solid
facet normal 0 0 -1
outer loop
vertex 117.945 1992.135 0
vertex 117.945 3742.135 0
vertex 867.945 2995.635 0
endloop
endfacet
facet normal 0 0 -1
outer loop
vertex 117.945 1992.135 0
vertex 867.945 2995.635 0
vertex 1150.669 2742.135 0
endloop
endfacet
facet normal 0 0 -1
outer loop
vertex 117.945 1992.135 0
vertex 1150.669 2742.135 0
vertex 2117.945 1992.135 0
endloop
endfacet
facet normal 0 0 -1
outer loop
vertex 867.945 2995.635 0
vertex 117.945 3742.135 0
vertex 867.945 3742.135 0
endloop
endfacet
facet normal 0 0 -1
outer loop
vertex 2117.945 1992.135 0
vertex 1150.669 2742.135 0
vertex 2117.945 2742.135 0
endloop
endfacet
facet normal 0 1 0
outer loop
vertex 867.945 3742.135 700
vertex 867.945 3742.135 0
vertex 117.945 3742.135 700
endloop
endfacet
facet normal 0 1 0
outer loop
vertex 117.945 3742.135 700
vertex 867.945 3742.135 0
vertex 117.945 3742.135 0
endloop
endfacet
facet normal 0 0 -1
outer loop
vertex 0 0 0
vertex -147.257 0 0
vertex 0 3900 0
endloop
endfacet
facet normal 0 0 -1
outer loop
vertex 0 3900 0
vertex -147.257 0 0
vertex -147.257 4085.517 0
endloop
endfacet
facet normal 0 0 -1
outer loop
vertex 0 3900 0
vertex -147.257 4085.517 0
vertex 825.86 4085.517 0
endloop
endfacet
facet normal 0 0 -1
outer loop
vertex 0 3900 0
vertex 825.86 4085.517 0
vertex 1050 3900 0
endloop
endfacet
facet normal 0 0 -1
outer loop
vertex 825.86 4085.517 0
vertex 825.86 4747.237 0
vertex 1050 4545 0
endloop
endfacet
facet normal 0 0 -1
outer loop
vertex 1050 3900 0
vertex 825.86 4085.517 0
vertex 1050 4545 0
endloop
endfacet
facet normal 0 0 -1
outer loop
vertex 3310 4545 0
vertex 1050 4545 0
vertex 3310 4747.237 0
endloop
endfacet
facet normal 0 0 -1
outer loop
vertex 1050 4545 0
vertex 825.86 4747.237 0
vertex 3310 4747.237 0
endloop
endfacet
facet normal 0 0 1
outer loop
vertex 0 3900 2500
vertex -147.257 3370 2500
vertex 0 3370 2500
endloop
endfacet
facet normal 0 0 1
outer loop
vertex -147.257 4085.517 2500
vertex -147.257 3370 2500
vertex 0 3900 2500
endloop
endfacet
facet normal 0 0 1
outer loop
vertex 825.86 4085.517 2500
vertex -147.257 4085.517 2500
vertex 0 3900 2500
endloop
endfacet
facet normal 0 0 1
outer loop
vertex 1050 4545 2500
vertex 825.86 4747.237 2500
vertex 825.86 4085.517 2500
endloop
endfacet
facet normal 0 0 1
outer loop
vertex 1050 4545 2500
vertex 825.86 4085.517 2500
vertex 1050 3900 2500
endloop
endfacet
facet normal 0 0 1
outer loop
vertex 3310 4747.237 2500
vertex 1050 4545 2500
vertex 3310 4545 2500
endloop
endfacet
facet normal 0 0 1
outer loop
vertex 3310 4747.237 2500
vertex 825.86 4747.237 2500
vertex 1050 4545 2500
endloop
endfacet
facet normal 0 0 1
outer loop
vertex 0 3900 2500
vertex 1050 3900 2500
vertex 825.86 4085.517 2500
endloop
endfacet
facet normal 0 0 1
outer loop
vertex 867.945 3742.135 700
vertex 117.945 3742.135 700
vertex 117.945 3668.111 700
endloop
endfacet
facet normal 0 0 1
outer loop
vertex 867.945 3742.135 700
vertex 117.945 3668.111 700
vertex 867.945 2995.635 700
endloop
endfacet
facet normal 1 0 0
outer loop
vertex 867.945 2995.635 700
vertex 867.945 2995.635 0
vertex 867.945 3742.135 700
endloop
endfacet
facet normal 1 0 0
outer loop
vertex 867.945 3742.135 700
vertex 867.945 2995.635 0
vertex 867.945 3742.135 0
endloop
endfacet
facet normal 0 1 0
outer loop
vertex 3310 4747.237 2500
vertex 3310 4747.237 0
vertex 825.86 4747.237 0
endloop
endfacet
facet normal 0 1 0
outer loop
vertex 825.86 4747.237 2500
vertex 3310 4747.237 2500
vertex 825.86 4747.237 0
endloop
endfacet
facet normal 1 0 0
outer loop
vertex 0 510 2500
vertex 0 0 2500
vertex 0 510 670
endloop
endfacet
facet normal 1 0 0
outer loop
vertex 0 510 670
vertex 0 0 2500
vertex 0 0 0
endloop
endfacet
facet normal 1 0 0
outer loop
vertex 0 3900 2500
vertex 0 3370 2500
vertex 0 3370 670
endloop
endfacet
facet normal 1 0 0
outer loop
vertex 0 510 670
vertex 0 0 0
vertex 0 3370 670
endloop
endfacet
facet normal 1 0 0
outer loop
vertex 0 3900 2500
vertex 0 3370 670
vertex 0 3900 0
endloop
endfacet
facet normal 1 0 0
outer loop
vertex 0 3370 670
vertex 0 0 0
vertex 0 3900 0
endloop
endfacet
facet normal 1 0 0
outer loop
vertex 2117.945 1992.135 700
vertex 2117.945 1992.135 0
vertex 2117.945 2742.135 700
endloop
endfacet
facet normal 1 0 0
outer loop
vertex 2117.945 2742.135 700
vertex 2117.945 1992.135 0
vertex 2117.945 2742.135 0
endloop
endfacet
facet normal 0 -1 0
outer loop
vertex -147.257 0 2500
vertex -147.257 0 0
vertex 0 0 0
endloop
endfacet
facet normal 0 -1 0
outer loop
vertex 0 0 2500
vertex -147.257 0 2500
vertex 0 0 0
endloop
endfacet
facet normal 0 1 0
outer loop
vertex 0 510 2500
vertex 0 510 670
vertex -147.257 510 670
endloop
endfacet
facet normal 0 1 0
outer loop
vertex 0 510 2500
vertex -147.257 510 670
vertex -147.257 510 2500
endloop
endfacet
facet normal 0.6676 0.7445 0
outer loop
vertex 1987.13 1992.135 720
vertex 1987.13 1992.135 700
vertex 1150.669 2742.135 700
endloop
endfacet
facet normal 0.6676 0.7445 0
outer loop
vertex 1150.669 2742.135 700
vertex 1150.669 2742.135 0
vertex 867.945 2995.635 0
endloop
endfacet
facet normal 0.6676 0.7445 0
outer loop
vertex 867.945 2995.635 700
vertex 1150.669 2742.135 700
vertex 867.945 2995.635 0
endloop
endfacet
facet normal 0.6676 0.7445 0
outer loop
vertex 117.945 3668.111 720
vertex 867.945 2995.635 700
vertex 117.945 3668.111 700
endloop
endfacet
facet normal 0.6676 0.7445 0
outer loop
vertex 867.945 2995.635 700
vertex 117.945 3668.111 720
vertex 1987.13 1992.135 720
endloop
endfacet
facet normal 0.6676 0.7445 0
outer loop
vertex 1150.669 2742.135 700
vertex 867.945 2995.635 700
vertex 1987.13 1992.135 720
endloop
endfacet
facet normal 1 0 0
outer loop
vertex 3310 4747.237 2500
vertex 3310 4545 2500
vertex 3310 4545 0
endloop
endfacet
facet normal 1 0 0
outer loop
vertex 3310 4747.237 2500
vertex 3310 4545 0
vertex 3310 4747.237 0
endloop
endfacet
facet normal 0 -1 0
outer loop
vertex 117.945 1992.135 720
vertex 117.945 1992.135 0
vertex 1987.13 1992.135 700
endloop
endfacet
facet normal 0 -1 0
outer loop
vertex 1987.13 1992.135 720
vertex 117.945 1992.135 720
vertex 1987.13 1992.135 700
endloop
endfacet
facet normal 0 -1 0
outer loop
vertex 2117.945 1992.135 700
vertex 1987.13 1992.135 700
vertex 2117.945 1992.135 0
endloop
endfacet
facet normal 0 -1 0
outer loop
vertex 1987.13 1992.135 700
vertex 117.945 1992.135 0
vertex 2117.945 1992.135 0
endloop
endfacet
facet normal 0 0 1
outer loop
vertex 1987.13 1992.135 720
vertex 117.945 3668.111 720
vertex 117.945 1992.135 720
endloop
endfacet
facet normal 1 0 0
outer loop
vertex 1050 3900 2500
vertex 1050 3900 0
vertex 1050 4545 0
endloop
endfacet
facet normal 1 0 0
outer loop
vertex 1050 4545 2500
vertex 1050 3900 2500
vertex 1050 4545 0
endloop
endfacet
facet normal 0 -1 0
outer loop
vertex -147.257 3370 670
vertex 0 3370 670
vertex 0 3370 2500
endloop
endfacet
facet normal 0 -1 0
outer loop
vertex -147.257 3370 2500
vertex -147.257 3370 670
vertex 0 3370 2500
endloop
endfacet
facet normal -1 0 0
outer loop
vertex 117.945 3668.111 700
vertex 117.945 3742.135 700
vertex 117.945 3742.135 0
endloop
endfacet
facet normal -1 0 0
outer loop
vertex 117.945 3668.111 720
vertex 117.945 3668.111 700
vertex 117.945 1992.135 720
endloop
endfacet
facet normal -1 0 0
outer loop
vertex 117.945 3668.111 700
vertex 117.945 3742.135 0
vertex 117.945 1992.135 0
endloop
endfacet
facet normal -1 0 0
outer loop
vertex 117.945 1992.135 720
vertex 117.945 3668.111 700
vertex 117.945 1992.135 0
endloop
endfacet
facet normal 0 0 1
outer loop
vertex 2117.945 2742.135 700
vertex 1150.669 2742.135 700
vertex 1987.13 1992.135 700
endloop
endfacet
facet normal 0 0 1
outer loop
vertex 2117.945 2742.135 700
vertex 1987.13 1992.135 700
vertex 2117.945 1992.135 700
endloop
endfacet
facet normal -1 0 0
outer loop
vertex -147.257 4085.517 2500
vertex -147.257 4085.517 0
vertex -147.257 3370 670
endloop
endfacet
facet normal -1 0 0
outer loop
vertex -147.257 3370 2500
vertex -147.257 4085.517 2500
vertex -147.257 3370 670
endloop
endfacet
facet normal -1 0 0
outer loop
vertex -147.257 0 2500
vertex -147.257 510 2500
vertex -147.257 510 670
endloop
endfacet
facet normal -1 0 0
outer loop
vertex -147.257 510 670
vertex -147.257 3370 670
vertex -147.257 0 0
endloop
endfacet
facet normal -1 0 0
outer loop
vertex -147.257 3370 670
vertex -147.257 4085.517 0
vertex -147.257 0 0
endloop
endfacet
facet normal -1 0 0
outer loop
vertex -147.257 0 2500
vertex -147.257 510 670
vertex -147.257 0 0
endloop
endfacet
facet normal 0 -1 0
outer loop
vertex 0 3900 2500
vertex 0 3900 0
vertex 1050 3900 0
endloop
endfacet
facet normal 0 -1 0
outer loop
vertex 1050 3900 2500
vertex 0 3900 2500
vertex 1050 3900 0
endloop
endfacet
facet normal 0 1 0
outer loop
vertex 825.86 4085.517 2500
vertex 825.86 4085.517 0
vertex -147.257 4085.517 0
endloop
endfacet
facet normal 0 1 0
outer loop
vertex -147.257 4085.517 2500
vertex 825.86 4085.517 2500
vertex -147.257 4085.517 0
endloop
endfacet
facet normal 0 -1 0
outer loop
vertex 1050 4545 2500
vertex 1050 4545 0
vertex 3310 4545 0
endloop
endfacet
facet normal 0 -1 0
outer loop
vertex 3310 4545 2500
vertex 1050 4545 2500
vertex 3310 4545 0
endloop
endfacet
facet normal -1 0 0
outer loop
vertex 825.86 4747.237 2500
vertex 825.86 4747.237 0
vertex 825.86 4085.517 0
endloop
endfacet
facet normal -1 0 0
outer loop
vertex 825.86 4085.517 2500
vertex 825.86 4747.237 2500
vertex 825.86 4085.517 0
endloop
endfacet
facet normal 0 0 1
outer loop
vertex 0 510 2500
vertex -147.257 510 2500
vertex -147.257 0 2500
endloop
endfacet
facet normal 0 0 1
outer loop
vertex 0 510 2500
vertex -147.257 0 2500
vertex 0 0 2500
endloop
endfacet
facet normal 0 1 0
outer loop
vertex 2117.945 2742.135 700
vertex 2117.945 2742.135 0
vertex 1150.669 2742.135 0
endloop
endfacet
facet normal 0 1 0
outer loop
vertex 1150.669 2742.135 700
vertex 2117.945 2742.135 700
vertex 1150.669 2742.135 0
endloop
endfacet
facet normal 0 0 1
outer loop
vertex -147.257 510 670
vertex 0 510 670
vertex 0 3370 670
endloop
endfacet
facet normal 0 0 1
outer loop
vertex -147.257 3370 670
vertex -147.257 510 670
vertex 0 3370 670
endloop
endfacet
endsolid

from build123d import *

# Parameters (mm, degrees)
F1_DEPTH = 2500
F2_W     = 2860
F2_H     = 1830
F3_DEPTH = 200
F4_W     = 750
F4_H     = 750
F5_DEPTH = 720
F6_DEPTH = 700


with BuildPart() as f1:
    # F0 (on Top) → F1 (new body)
    with BuildSketch(Plane.XY):
        Polygon((-147.2565531731, 0), (0, 0), (0, 3900), (1050, 3900), (1050, 4545), (3310, 4545), (3310, 4747.2367286682), (825.8602023125, 4747.2367286682), (825.8602023125, 4085.5174064636), (-147.2565531731, 4085.5174064636), align=None)
    extrude(amount=F1_DEPTH)

    # F2 (on face) → F3 (cut)
    with BuildSketch(Plane.YZ):
        with Locations((1940, 1585)):
            Rectangle(F2_W, F2_H)
    extrude(amount=-F3_DEPTH, mode=Mode.SUBTRACT)


with BuildPart() as f5:
    # F4 (on Top) → F5 (new body)
    with BuildSketch(Plane.XY):
        Polygon((1150.6690001684, 2742.1345710754), (867.9449260235, 2742.1345710754), (867.9449260235, 1992.1345710754), (1987.1300632173, 1992.1345710754), align=None)
        Polygon((1150.6690001684, 2742.1345710754), (867.9449260235, 2995.6347816361), (867.9449260235, 2742.1345710754), align=None)
        Polygon((867.9449260235, 2742.1345710754), (867.9449260235, 2995.6347816361), (117.9449260235, 3668.1107937887), (117.9449260235, 2742.1345710754), align=None)
        with Locations((492.9449260235, 2367.1345710754)):
            Rectangle(F4_W, F4_H)
    extrude(amount=F5_DEPTH)

    # F4 (on Top) → F6 (join)
    with BuildSketch(Plane.XY):
        Polygon((867.9449260235, 2995.6347816361), (867.9449260235, 3742.1345710754), (117.9449260235, 3742.1345710754), (117.9449260235, 3668.1107937887), align=None)
        Polygon((2117.9449260235, 2742.1345710754), (1150.6690001684, 2742.1345710754), (1987.1300632173, 1992.1345710754), (2117.9449260235, 1992.1345710754), align=None)
    extrude(amount=F6_DEPTH)


solid = Compound([f1.part, f5.part])
